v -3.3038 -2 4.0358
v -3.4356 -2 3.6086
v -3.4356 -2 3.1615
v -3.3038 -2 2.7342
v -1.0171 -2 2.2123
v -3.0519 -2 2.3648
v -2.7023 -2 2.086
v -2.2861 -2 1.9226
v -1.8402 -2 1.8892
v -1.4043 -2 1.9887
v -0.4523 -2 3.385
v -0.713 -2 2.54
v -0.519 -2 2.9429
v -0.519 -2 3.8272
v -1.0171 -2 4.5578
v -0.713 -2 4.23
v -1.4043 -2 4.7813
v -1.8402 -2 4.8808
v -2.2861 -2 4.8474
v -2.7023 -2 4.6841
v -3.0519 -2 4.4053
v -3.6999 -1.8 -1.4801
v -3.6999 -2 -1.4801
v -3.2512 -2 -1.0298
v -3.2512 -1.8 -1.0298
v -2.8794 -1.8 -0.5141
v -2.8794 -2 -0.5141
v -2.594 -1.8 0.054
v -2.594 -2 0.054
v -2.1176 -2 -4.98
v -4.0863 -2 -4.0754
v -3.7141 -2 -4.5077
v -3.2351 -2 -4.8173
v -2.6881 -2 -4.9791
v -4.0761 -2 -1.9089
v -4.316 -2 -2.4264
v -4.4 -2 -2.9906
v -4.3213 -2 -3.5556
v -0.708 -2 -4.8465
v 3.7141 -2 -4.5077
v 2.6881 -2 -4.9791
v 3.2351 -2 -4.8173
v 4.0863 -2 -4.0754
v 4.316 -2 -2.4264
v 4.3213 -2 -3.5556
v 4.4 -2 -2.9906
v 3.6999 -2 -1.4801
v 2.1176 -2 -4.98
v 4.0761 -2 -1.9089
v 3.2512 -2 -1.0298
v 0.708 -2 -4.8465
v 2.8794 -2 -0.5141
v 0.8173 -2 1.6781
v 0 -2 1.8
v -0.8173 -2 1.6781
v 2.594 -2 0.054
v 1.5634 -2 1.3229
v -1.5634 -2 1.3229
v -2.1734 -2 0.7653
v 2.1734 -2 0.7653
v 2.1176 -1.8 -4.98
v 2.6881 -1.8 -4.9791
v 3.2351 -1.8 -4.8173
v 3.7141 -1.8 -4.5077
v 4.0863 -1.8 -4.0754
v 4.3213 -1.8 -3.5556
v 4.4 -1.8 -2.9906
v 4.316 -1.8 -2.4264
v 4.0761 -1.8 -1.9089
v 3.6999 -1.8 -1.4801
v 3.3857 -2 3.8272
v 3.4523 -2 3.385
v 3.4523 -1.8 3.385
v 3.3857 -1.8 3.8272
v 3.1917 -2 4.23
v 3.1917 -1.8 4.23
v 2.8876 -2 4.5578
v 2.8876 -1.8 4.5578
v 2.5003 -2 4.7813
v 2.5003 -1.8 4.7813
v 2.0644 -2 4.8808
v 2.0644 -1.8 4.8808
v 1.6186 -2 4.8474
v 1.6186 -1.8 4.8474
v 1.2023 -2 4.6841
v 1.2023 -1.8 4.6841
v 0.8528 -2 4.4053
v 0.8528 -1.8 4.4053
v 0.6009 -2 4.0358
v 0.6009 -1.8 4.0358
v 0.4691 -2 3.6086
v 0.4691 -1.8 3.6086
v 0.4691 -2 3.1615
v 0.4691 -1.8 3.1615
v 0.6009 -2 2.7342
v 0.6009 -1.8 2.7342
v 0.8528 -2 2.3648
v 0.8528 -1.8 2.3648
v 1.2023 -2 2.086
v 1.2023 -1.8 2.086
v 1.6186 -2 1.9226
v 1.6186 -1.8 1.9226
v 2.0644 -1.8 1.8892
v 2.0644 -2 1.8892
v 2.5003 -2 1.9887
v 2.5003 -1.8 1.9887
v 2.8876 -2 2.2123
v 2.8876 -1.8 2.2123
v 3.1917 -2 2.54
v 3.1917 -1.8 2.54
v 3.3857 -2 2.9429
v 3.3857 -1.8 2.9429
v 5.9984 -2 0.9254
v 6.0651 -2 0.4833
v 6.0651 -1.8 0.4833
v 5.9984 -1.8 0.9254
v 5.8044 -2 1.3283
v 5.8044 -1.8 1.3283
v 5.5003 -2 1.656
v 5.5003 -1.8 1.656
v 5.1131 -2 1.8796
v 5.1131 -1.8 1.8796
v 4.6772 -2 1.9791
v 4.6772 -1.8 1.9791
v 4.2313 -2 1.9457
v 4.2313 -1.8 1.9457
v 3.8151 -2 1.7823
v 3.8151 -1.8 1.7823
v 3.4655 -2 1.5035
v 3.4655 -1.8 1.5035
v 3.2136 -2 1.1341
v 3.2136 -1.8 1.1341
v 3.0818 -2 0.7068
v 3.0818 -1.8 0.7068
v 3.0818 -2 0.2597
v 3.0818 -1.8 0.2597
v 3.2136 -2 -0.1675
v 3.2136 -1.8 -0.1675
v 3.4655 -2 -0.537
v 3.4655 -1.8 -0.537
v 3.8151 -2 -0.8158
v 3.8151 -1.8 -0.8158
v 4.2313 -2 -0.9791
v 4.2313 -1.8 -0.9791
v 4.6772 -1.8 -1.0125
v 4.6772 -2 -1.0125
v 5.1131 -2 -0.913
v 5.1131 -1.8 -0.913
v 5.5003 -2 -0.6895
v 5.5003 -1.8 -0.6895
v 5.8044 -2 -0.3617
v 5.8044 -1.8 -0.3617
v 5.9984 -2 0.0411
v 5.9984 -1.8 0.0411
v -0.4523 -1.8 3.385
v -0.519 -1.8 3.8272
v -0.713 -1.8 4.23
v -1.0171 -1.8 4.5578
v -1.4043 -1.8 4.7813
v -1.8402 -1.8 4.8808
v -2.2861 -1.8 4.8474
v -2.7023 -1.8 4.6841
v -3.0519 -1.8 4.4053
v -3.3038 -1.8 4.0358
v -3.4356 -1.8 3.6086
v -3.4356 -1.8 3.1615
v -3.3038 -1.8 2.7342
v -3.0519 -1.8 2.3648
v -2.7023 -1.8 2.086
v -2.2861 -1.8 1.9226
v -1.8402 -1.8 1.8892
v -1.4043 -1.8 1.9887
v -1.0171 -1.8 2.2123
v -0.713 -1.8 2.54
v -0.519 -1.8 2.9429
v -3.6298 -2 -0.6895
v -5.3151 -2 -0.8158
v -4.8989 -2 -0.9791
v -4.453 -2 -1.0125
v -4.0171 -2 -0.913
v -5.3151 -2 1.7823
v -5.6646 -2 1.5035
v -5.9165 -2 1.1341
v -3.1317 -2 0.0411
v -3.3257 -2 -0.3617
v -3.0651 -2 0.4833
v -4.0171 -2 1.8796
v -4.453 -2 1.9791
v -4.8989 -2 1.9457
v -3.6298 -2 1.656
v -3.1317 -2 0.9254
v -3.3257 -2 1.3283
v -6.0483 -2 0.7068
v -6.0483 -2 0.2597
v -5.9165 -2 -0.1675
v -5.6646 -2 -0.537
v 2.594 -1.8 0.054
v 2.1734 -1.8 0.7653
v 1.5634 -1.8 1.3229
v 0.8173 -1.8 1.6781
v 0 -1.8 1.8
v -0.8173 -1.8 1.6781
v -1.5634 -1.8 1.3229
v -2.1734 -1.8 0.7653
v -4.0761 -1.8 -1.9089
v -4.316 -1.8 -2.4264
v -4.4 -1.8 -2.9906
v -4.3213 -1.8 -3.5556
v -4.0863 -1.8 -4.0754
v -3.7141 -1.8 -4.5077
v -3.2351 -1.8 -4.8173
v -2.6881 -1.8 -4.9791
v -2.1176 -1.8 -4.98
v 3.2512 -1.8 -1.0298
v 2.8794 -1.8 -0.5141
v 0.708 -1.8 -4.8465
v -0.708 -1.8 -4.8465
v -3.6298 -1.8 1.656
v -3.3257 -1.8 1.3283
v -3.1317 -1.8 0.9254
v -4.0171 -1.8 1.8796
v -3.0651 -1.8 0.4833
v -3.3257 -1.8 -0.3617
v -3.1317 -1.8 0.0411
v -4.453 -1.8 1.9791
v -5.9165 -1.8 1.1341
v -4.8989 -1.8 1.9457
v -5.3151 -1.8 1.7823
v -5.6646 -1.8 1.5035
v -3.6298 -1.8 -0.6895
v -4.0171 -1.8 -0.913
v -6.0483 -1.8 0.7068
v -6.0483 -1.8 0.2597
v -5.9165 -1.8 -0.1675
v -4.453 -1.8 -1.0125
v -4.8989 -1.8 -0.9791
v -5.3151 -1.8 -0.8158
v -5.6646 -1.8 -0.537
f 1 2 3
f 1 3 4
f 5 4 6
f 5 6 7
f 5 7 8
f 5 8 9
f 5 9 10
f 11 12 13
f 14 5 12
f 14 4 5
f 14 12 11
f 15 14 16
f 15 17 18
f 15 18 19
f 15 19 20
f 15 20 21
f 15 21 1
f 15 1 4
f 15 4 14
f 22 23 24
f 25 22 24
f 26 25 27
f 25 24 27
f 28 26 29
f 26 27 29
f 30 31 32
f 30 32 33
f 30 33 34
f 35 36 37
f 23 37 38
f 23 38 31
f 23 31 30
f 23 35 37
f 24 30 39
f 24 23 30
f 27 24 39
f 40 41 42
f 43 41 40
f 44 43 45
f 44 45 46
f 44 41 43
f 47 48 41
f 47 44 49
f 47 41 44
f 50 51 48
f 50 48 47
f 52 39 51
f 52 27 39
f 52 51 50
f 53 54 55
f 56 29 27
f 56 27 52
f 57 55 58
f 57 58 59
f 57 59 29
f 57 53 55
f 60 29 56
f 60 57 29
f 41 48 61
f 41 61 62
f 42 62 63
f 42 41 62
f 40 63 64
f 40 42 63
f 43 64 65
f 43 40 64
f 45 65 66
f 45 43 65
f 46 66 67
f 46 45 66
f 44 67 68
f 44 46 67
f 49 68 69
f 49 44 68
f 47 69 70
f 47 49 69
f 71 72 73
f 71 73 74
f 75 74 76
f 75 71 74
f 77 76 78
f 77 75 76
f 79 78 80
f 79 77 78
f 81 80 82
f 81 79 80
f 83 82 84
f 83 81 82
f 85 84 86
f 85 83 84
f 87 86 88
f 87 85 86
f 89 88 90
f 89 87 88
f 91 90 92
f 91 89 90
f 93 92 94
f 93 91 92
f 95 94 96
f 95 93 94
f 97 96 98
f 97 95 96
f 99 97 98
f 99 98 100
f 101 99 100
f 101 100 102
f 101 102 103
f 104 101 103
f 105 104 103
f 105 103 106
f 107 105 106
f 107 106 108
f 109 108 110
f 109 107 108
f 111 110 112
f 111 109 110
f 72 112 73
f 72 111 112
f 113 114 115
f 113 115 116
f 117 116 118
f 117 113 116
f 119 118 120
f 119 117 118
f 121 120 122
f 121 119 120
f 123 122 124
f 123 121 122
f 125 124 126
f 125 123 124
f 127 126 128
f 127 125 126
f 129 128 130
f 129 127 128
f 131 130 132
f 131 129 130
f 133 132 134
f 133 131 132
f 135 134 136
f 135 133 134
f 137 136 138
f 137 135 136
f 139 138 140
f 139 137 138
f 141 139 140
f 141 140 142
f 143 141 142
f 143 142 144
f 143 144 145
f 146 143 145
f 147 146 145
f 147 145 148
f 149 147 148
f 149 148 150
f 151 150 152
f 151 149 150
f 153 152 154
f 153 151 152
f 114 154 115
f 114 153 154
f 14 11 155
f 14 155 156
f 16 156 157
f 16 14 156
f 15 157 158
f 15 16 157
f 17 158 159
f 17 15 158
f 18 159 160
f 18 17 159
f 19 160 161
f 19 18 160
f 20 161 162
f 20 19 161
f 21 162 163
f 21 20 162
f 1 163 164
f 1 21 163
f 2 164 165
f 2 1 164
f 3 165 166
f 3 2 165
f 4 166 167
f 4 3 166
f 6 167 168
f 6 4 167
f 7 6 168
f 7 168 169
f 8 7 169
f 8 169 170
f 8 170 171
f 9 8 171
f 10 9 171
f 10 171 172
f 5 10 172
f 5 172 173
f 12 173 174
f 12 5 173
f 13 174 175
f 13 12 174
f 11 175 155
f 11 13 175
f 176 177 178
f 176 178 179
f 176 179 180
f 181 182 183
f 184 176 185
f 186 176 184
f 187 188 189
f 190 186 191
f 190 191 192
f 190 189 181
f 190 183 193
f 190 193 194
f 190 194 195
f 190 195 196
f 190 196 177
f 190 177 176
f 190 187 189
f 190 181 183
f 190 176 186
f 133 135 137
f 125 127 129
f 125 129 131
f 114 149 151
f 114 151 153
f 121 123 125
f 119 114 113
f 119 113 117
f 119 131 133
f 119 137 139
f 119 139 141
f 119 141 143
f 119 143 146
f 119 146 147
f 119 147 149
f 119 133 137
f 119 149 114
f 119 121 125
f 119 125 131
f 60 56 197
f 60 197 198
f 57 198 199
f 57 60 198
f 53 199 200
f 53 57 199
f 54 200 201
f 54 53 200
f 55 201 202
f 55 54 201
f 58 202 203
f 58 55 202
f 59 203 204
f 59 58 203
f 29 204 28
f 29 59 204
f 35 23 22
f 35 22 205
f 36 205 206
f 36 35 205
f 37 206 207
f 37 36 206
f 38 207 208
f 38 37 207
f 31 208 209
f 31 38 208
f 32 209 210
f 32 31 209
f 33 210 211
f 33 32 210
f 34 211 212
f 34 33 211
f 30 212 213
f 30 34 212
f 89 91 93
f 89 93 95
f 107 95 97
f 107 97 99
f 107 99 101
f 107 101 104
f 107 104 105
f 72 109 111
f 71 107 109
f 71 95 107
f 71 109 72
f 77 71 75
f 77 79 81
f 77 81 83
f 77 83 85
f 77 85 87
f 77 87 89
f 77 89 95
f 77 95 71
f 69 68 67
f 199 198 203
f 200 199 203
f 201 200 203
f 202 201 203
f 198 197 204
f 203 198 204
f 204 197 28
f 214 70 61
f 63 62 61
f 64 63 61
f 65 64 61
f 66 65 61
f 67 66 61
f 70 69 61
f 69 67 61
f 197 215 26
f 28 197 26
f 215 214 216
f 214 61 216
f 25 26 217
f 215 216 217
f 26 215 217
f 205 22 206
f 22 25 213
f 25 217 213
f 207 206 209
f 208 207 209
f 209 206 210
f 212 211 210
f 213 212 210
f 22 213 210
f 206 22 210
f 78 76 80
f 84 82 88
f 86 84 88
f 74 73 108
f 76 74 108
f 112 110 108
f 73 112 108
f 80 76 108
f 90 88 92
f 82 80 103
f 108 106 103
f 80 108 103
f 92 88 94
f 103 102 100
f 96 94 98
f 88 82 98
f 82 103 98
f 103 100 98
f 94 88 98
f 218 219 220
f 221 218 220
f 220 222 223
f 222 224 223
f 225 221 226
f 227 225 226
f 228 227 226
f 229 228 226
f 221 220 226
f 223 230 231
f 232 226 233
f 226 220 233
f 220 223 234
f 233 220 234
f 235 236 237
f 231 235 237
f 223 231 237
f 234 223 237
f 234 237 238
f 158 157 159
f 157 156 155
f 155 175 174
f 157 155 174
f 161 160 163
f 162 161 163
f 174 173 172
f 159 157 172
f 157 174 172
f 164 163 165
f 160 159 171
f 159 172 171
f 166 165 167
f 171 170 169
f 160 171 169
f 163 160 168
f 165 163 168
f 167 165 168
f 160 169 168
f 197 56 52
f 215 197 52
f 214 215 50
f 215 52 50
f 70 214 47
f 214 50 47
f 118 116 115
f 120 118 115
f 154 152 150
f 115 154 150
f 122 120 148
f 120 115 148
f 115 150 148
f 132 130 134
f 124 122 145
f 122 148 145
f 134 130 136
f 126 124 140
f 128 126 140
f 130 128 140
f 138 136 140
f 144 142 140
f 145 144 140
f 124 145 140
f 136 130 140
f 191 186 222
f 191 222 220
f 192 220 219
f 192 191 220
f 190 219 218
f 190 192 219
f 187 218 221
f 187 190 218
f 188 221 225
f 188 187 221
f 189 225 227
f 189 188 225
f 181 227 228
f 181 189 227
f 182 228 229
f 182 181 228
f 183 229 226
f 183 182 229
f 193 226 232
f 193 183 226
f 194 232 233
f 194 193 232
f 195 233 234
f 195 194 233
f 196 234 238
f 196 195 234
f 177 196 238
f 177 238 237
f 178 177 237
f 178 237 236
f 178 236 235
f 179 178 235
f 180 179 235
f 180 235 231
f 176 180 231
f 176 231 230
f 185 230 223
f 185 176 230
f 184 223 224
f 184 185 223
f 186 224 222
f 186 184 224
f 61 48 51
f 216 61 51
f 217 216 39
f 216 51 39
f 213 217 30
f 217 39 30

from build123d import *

# Parameters (mm, degrees)
BOX007_W     = 22
BOX007_H     = 1.8
BOX007_DEPTH = 22
BOX006_W     = 20
BOX006_H     = 20
BOX006_DEPTH = 1.8
SKETCH038_R  = 1.5
PAD011_DEPTH = 0.2


with BuildPart() as cube001:
    # Box007 → Box007 (new body)
    with BuildSketch(Plane(origin=(11, 0, -11), x_dir=(-1, 0, 0), z_dir=(0, 0, 1))):
        with Locations((11, 0.9)):
            Rectangle(BOX007_W, BOX007_H)
    extrude(amount=BOX007_DEPTH)


with BuildPart() as beans001:
    # Box006 → Box006 (join)
    with BuildSketch(Plane(origin=(-10, 0, -10), x_dir=(1, 0, 0), z_dir=(0, -1, 0))):
        with Locations((10, 10)):
            Rectangle(BOX006_W, BOX006_H)
    extrude(amount=BOX006_DEPTH)

    # Sketch038 → Pad011 (join)
    with BuildSketch(Plane(origin=(0, -2, -1), x_dir=(1, 0, 0), z_dir=(0, -1, 0))):
        with Locations((-4.565071, 1.483282)):
            Circle(SKETCH038_R)
        with Locations((4.565071, 1.483282)):
            Circle(SKETCH038_R)
        with Locations((-1.952336, 4.385018)):
            Circle(SKETCH038_R)
        with Locations((1.952336, 4.385018)):
            Circle(SKETCH038_R)
        with BuildLine():
            ThreePointArc((2.594039, 1.054023), (0, 2.8), (-2.594039, 1.054023))
            ThreePointArc((-3.699936, -0.480077), (-3.055021, 0.220676), (-2.594039, 1.054023))
            ThreePointArc((-3.699936, -0.480077), (-4.22241, -2.823905), (-2.117647, -3.979969))
            ThreePointArc((2.117647, -3.979969), (0, -3.829736), (-2.117647, -3.979969))
            ThreePointArc((2.117647, -3.979969), (4.22241, -2.823905), (3.699936, -0.480077))
            ThreePointArc((2.594039, 1.054023), (3.055021, 0.220676), (3.699936, -0.480077))
        make_face()
    extrude(amount=-PAD011_DEPTH)

    # Cut002: cut Cube001
    add(cube001.part, mode=Mode.SUBTRACT)


solid = beans001.part
